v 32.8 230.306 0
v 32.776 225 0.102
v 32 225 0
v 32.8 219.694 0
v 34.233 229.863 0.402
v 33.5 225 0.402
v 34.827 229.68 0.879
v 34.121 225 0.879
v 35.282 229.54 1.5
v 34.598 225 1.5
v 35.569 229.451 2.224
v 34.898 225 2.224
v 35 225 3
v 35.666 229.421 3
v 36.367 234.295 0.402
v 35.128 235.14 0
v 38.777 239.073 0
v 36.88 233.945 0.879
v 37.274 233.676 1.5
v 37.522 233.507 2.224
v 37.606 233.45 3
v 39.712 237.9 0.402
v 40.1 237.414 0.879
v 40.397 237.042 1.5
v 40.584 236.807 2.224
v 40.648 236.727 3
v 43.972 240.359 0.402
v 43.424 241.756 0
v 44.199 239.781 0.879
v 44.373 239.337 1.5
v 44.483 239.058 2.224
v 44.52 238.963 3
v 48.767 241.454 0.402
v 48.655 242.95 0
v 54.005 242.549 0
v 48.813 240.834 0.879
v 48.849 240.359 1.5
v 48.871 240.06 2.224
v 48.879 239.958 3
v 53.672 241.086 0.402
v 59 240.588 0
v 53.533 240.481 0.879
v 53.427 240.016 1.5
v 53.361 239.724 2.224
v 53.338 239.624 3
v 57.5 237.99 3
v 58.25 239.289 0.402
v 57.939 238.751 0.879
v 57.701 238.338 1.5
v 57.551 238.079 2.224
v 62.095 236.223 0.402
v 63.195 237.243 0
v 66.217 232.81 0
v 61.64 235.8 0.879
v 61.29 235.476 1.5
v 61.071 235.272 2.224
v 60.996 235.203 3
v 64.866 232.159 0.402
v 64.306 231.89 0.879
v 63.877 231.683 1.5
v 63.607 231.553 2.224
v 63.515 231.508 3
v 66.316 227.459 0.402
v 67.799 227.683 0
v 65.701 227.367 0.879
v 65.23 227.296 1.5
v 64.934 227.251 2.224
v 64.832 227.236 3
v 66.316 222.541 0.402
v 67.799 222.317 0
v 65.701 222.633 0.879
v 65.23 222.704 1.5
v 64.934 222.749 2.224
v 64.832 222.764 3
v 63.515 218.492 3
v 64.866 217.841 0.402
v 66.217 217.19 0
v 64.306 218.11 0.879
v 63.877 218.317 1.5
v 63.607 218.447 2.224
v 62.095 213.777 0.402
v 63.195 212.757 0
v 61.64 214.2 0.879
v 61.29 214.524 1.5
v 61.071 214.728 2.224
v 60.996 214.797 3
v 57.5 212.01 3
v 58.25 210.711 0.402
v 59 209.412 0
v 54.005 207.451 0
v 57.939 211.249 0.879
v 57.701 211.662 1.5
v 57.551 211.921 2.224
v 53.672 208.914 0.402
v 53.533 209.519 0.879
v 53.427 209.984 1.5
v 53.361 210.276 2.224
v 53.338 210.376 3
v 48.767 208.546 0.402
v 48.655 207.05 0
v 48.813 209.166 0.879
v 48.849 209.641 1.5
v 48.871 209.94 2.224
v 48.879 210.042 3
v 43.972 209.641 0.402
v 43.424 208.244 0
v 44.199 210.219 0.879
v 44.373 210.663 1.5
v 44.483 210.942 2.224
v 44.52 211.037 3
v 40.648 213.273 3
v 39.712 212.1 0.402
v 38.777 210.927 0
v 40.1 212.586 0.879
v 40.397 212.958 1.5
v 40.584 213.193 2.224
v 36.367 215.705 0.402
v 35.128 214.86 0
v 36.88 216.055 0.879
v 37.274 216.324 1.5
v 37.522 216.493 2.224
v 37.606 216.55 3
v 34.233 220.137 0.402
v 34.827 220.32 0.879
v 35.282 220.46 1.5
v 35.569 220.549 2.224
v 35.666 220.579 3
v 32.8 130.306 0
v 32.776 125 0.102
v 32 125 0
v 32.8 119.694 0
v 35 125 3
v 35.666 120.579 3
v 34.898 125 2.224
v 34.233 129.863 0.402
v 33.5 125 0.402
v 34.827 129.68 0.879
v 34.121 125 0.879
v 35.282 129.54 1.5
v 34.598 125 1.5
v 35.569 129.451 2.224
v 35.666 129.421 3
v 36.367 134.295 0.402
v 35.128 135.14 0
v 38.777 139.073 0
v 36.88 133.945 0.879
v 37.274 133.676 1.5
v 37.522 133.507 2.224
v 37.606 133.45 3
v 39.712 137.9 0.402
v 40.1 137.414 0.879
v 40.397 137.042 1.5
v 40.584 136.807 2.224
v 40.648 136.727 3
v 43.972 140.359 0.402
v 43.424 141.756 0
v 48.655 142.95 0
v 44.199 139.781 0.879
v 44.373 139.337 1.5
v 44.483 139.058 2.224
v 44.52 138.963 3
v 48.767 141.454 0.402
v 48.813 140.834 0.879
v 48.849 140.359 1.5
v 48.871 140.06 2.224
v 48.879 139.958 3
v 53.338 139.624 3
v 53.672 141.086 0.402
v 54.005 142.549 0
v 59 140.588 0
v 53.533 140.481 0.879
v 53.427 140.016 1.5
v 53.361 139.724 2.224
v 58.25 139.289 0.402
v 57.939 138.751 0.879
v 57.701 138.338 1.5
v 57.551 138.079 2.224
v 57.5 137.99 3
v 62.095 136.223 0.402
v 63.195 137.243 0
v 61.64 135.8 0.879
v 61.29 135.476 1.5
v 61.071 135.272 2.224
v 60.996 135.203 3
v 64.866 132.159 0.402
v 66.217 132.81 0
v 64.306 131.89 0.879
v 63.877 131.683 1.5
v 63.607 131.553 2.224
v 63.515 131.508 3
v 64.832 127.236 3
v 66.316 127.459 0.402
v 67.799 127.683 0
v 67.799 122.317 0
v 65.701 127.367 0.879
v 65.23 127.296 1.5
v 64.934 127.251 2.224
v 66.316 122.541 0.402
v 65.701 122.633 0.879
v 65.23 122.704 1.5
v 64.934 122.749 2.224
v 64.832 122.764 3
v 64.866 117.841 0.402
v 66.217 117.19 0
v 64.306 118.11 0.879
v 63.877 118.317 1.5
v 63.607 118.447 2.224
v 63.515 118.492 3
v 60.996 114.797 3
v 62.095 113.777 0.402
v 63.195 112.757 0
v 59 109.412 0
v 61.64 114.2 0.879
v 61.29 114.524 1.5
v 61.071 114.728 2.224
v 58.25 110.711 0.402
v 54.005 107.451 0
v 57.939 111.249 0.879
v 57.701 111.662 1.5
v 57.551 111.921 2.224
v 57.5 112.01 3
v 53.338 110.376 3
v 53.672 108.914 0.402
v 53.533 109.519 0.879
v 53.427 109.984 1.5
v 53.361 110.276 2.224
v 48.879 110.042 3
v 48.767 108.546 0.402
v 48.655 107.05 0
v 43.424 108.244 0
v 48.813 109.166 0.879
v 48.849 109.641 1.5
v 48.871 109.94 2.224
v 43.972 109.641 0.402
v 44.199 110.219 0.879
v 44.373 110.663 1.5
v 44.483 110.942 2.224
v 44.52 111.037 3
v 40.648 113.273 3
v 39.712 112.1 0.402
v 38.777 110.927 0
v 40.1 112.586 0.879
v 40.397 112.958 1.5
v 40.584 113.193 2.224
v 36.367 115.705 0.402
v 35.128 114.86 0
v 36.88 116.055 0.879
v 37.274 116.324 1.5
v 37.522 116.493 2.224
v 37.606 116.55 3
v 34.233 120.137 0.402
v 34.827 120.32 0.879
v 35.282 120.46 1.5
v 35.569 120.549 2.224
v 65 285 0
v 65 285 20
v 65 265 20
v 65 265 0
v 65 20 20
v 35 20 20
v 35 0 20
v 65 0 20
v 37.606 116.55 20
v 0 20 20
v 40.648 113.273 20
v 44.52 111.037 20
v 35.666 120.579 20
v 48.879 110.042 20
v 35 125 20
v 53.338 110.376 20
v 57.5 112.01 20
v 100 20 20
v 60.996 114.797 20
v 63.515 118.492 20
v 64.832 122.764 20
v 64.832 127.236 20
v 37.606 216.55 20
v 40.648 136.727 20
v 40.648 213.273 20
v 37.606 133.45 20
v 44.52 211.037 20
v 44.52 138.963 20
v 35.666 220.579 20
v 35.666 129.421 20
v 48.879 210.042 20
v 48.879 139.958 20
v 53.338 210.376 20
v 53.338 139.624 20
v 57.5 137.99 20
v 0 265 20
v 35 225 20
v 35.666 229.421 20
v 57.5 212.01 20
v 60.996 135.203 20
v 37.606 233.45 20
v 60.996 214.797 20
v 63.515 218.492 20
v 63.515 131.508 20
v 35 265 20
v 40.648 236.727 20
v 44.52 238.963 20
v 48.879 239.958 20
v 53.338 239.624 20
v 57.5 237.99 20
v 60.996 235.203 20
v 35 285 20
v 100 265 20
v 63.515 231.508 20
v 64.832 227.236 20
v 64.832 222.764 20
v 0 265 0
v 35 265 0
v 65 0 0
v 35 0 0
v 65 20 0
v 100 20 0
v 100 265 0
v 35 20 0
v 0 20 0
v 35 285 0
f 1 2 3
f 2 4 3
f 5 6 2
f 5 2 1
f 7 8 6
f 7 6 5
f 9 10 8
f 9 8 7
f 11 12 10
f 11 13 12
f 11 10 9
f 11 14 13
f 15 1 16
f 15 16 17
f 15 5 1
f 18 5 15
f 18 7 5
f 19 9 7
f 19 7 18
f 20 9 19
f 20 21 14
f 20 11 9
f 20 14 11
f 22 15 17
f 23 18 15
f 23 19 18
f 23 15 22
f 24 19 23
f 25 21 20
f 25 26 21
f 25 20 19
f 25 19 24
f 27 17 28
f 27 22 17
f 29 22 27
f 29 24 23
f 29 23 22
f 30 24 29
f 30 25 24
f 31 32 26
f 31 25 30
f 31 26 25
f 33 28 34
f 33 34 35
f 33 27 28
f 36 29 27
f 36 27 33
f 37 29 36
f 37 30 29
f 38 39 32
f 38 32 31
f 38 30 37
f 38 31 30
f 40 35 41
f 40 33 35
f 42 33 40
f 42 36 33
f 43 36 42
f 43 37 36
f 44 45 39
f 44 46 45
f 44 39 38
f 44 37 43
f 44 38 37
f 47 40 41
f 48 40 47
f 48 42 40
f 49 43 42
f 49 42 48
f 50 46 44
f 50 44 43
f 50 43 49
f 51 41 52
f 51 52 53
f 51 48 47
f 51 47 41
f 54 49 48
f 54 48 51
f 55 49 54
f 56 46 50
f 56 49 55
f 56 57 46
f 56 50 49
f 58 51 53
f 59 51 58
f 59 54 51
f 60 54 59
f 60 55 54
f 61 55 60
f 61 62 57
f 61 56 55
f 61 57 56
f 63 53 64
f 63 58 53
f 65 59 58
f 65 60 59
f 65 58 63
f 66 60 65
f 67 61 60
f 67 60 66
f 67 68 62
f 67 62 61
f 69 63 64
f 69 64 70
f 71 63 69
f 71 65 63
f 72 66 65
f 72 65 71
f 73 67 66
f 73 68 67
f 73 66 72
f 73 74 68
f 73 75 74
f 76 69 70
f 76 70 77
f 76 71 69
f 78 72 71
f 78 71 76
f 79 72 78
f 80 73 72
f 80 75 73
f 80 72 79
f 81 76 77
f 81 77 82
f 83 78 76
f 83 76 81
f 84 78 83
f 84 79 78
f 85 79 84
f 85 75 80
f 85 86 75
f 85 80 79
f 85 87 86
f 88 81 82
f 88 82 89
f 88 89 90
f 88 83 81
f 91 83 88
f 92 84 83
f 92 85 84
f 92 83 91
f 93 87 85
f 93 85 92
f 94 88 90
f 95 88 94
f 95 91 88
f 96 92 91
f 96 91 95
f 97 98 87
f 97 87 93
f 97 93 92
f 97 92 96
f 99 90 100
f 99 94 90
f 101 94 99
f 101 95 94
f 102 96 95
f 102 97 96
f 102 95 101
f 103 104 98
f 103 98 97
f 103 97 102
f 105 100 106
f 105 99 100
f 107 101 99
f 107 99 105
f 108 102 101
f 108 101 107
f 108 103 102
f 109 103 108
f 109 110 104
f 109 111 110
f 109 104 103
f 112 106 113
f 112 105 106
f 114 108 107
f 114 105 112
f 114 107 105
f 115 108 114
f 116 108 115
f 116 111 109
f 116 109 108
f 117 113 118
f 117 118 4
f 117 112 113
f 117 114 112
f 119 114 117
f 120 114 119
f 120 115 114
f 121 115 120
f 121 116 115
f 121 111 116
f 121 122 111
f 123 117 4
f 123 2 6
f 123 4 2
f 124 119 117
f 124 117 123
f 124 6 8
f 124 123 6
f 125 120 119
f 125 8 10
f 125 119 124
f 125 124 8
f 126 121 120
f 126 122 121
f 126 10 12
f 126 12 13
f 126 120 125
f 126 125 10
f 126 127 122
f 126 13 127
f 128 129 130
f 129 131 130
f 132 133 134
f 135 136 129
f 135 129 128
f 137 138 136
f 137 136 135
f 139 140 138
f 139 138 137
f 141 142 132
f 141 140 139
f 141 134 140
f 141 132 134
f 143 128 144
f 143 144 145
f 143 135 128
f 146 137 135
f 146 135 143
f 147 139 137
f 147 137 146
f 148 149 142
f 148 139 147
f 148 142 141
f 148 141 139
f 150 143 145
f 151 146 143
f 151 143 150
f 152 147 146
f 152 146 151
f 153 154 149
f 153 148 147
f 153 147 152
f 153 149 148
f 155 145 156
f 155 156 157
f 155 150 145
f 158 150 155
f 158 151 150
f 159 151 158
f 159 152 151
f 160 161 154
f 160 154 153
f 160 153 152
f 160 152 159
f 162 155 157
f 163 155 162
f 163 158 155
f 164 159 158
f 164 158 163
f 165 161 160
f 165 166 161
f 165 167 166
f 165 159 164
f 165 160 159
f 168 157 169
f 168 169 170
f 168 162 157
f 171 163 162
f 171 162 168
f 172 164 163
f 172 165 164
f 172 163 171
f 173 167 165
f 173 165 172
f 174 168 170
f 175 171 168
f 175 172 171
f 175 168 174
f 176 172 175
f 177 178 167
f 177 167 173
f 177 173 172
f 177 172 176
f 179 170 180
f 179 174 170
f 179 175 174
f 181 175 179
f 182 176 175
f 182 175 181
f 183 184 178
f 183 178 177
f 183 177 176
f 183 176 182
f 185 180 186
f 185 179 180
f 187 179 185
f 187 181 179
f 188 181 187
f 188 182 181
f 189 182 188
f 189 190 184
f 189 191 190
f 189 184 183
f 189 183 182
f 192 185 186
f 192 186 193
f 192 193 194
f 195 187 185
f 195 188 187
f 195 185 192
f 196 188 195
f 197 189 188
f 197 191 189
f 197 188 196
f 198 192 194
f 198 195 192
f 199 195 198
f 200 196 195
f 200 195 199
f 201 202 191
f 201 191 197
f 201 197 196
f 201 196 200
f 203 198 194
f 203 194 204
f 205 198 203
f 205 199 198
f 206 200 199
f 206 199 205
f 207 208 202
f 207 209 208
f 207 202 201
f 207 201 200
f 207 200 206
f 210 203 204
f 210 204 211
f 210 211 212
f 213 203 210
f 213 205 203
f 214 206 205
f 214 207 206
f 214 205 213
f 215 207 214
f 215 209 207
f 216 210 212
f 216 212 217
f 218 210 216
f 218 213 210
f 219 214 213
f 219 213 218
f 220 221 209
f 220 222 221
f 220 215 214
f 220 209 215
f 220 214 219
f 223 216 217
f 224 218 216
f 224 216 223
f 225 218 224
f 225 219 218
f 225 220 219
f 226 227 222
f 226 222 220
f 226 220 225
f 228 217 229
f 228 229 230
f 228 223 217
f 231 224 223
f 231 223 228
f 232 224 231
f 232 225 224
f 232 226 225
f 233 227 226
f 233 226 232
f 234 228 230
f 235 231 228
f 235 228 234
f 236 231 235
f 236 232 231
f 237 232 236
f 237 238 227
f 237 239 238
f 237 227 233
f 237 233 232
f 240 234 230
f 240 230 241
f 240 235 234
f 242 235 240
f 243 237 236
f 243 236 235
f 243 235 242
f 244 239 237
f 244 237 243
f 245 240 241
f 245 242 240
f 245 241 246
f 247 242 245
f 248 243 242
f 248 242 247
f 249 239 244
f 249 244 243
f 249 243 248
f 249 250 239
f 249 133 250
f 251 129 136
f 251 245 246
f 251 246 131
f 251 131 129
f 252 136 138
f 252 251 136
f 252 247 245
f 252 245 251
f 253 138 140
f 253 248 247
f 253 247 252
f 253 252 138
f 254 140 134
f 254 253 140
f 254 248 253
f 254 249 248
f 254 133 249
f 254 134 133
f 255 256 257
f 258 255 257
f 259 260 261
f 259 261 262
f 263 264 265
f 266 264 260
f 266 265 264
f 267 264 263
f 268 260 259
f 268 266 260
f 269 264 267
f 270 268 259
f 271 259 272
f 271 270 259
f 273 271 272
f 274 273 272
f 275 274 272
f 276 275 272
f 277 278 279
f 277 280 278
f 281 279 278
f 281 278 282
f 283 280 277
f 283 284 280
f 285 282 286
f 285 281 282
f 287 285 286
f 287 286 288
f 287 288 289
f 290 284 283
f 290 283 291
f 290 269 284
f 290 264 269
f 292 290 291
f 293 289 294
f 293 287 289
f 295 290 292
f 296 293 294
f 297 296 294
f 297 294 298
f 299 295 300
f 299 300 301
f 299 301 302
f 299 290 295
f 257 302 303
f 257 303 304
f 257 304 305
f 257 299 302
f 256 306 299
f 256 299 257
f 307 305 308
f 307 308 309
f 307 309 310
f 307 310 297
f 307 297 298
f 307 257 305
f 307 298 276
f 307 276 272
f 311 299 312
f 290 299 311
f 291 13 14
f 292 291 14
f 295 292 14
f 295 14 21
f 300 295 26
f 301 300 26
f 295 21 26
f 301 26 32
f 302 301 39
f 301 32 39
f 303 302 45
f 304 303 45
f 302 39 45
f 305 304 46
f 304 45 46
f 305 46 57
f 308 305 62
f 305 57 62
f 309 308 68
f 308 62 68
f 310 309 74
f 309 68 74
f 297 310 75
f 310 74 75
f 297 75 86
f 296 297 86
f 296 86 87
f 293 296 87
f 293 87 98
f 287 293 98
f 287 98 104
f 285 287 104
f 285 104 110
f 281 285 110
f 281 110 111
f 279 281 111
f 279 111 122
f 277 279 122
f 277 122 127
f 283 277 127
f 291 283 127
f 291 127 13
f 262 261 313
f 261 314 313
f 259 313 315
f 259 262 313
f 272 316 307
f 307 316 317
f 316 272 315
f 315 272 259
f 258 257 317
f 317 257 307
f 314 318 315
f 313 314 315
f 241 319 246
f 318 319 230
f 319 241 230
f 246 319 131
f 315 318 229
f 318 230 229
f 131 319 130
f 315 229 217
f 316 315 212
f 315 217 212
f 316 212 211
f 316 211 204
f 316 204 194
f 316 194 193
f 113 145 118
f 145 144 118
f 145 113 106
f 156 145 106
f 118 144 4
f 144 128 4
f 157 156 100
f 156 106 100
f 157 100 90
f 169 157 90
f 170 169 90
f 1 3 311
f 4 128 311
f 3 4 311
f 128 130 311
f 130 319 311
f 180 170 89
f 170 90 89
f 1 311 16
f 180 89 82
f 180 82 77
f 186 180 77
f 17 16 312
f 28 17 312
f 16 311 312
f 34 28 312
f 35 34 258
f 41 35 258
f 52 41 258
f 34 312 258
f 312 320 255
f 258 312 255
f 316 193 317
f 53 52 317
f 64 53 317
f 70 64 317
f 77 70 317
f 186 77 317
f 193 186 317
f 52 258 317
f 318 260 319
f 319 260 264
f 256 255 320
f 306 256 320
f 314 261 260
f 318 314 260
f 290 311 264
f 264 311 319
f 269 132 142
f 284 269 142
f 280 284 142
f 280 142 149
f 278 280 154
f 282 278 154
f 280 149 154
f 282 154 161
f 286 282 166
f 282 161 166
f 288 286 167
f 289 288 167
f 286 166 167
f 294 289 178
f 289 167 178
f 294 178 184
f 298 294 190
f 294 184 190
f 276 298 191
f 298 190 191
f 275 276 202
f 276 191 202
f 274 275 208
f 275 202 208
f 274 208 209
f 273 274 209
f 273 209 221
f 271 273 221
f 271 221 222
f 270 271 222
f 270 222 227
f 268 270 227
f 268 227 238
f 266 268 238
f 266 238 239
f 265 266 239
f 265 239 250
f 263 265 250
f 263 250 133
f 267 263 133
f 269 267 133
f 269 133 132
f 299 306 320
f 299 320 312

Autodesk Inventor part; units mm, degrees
ref_plane "YZ Plane" through (0, 0, 0) normal (1, 0, 0) x (0, 1, 0)
ref_plane "XZ Plane" through (0, 0, 0) normal (0, 1, 0) x (-1, 0, 0)
ref_plane "XY Plane" through (0, 0, 0) normal (0, 0, 1) x (1, 0, 0)
sketch "Sketch1" plane through (0, 0, 0) normal (0, 0, 1) x (1, 0, 0)
  line L0 (0, 0) -> (100, 0)
  line L1 (100, 0) -> (100, 285)
  line L2 (100, 285) -> (0, 285)
  line L3 (0, 285) -> (0, 0)
  dimension "d0" = 100
  dimension "d1" = 285
extrude "Extrusion1" add sketch "Sketch1" along normal blind 20
sketch "Sketch2" plane through (0, 0, 0) normal (0, 0, -1) x (-1, 0, 0)
  circle A0 centre (-50, 125) radius 15
  circle A1 centre (-50, 225) radius 15
  line L0 (0, 285) -> (0, 0) projected
  line L1 (0, 0) -> (-100, 0) projected
  dimension "d5" = 30
  dimension "d6" = 50
  dimension "d7" = 50
  dimension "d9" = 100
  dimension "d13" = 125
extrude "Extrusion2" cut sketch "Sketch2" against normal up to next
sketch "Sketch3" plane through (0, 0, 20) normal (0, 0, 1) x (1, 0, 0)
  line L0 (0, 0) -> (100, 0) projected
  line L1 (100, 285) -> (0, 285) projected
  line L2 (35, 285) -> (35, 265)
  line L3 (0, 285) -> (0, 0) projected
  line L4 (100, 0) -> (100, 285) projected
  line L5 (35, 265) -> (0, 265)
  line L6 (65, 285) -> (65, 265)
  line L7 (65, 265) -> (100, 265)
  line L8 (35, 0) -> (35, 20)
  line L9 (35, 20) -> (0, 20)
  line L10 (65, 0) -> (65, 20)
  line L11 (100, 20) -> (65, 20)
  dimension "d14" = 30
  dimension "d26" = 35
  dimension "d27" = 20
  dimension "d28" = 20
extrude "Extrusion3" cut sketch "Sketch3" against normal up to next contours L3 L9 L8 L0 | L10 L11 L4 L0 | L3 L1 L2 L5 | L7 L6 L1 L4
sketch "Sketch5" plane through (100, 20, 0) normal (1, 0, 0) x (0, 0, -1)
  line L0 (-20, 0) -> (-20, 245) projected
  line L1 (-20, 122.5) -> (-90.7107, 193.2107) construction
  line L2 (-20, 122.5) -> (80, 122.5) construction
  line L3 (-20, 265) -> (0, 265) projected
  point P0 (0, -20)
  dimension "d21" = 100
  dimension "d22" = 135
  dimension "d23" = 142.5
fillet "Fillet1" radius 3 2 edges at (65, 125, 0) (65, 225, 0)
properties part number "MidjuHaldarar" material "Wood (Birch)"
